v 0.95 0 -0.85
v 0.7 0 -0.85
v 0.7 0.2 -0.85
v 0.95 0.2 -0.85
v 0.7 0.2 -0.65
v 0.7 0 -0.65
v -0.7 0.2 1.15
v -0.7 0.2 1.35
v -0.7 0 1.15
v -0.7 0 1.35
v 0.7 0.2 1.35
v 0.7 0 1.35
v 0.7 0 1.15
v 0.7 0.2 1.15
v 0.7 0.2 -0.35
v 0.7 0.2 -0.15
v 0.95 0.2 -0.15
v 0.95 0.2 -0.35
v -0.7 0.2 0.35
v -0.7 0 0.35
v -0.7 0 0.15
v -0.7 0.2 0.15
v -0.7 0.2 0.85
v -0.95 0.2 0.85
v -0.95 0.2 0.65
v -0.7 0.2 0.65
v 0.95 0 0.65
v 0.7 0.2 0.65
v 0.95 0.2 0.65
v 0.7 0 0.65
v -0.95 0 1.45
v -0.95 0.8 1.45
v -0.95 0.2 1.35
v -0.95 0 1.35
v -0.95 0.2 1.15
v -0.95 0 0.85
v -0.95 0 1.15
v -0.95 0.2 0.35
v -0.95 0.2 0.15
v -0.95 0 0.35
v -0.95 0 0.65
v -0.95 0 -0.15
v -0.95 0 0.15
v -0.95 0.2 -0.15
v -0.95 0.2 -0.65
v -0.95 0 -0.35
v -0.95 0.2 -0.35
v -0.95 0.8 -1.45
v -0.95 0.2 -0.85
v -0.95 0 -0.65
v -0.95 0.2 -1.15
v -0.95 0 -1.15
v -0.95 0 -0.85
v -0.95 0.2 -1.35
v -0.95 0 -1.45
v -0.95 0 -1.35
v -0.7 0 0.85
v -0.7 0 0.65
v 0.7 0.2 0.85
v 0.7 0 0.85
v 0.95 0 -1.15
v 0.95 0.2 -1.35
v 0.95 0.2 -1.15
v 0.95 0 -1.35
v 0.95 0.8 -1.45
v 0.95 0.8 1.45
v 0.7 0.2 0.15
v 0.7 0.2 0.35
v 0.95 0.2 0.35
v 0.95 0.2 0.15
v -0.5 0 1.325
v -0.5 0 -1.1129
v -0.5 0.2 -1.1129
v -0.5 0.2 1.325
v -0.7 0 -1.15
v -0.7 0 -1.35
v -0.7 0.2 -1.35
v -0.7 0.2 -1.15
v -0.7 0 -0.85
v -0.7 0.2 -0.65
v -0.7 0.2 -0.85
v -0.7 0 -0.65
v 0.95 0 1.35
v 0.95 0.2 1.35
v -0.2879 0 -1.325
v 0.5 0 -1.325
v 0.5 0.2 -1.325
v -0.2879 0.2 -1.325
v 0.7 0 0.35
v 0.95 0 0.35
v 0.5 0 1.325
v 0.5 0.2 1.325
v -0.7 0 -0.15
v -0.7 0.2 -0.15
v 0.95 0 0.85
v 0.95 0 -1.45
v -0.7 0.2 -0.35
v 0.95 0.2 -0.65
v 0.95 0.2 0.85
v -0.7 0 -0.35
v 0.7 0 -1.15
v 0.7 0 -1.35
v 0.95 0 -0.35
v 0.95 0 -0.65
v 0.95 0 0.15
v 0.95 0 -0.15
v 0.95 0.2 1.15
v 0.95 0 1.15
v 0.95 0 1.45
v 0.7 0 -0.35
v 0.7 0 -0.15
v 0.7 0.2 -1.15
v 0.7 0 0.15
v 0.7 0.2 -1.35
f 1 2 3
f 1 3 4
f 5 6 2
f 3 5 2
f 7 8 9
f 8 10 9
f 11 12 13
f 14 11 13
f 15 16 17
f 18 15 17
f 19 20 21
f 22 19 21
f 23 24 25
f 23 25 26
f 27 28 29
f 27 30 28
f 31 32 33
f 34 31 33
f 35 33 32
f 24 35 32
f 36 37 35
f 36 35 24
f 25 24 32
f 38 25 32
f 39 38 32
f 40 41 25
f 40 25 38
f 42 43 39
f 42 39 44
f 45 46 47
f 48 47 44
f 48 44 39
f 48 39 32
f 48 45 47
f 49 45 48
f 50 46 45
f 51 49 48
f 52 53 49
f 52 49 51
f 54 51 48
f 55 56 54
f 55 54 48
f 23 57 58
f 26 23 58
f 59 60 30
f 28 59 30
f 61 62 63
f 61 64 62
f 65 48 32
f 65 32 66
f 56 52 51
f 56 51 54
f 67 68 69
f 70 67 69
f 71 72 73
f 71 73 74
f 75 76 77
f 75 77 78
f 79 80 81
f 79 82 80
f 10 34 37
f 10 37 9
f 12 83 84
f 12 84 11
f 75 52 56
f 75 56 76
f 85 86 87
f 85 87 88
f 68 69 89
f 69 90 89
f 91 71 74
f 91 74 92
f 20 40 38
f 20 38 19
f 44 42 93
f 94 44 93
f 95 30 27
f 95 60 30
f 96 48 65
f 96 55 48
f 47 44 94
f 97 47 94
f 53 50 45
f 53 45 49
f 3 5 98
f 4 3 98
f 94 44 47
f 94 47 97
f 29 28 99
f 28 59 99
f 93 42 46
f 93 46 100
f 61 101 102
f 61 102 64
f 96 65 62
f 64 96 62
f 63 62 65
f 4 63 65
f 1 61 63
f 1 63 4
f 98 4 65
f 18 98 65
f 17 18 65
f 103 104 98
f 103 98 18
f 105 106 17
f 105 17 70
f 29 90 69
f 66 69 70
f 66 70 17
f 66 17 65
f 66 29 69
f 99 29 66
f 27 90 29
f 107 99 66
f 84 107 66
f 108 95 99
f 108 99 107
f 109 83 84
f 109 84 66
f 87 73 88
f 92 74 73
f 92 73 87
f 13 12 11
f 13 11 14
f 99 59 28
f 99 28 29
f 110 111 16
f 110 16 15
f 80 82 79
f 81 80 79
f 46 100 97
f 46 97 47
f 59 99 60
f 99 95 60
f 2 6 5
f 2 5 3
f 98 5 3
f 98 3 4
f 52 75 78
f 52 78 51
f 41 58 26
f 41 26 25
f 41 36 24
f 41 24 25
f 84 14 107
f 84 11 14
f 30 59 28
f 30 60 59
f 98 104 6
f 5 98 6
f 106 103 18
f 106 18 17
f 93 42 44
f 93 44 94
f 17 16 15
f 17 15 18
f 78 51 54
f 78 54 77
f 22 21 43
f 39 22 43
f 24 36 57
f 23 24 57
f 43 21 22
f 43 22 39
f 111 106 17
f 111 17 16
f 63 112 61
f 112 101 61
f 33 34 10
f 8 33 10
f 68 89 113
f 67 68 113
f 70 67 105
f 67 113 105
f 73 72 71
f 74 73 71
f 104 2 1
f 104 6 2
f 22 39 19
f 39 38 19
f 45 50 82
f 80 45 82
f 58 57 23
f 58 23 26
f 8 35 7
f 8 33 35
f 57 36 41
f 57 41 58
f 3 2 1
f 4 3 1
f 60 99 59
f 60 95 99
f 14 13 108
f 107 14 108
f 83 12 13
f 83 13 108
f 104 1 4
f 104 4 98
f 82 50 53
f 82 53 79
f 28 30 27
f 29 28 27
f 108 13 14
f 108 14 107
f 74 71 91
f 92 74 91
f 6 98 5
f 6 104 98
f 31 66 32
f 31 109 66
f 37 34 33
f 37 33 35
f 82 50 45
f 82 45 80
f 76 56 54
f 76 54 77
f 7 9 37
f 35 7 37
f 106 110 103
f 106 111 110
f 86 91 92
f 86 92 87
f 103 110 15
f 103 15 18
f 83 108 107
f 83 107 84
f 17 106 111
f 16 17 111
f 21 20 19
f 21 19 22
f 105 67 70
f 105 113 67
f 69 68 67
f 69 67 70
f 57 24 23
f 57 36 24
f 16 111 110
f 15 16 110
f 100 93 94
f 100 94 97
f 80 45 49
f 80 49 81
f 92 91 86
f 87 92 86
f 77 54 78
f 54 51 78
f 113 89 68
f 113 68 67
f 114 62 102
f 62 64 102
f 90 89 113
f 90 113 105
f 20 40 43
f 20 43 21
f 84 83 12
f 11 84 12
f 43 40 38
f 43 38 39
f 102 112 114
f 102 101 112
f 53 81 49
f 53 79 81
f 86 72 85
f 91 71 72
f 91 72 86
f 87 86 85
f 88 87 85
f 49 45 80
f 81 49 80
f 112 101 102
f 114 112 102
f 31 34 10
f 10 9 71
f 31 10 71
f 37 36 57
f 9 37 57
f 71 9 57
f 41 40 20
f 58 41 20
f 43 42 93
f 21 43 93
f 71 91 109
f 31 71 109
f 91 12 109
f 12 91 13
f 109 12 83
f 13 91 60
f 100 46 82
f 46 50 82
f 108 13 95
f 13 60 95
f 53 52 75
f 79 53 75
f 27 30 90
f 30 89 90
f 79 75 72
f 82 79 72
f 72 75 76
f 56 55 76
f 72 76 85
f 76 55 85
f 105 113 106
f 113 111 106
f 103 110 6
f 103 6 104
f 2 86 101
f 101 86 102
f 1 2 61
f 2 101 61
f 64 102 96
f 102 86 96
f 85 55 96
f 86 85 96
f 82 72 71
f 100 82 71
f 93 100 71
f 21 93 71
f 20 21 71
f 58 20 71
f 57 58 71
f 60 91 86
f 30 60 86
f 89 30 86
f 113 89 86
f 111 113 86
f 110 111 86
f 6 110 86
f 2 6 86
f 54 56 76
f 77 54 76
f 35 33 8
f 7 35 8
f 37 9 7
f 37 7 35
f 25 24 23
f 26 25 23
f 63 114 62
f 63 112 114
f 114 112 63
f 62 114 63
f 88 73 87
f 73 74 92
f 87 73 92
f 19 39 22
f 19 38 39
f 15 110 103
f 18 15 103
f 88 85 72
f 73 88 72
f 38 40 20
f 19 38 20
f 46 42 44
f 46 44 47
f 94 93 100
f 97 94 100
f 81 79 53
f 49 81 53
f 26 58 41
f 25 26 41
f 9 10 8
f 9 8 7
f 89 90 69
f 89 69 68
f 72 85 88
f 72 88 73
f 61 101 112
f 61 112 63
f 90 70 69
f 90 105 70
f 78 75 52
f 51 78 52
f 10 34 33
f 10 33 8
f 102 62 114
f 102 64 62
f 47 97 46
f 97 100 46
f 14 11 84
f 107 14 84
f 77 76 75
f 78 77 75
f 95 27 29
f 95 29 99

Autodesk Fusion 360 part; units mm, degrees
sketch "草图1" plane through (0, 0, 0) normal (0, 1, 0) x (1, 0, 0)
  line L0 (-0.95, 1.45) -> (0.95, 1.45)
  line L1 (0.95, 1.45) -> (0.95, -1.45)
  line L2 (0.95, -1.45) -> (-0.95, -1.45)
  line L3 (-0.95, -1.45) -> (-0.95, 1.45)
  line L4 (-0.95, 1.45) -> (0.95, -1.45) construction
  line L5 (0.95, 1.45) -> (-0.95, -1.45) construction
  dimension "d1" = 2.9
  dimension "d2" = 1.9
extrude "拉伸1" add sketch "草图1" along normal blind 0.8 makes body 1
sketch "草图2" plane through (0, 0, 0) normal (0, -1, 0) x (1, 0, 0)
  line L0 (0.95, 1.45) -> (-0.95, 1.45)
  line L1 (-0.95, 1.45) -> (-0.95, -1.45)
  line L2 (-0.95, -1.45) -> (0.95, -1.45)
  line L3 (0.95, -1.45) -> (0.95, 1.45)
  line L4 (0, 2.5) -> (0, -3) construction
  line L5 (-2.5, 0) -> (3, 0) construction
  line L6 (-0.5, 1.325) -> (0.5, 1.325)
  line L7 (0.5, 1.325) -> (0.5, -1.325)
  line L8 (0.5, -1.325) -> (-0.2879, -1.325)
  line L9 (-0.2879, -1.325) -> (-0.5, -1.1129)
  line L10 (-0.5, -1.1129) -> (-0.5, 1.325)
  line L11 (-0.95, 1.35) -> (-0.7, 1.35)
  line L12 (-0.7, 1.35) -> (-0.7, 1.15)
  line L13 (-0.7, 1.15) -> (-0.95, 1.15)
  line L14 (-0.95, 1.15) -> (-0.95, 1.35)
  line L15 (-0.7, -1.15) -> (-0.95, -1.15)
  line L16 (-0.7, -1.35) -> (-0.7, -1.15)
  line L17 (-0.95, -1.15) -> (-0.95, -1.35)
  line L18 (-0.95, -1.35) -> (-0.7, -1.35)
  line L19 (-0.7, 0.65) -> (-0.95, 0.65)
  line L20 (-0.7, 0.85) -> (-0.7, 0.65)
  line L21 (-0.95, 0.85) -> (-0.7, 0.85)
  line L22 (-0.95, 0.65) -> (-0.95, 0.85)
  line L23 (-0.7, 0.15) -> (-0.95, 0.15)
  line L24 (-0.7, 0.35) -> (-0.7, 0.15)
  line L25 (-0.95, 0.35) -> (-0.7, 0.35)
  line L26 (-0.95, 0.15) -> (-0.95, 0.35)
  line L27 (-0.7, -0.35) -> (-0.95, -0.35)
  line L28 (-0.7, -0.15) -> (-0.7, -0.35)
  line L29 (-0.95, -0.15) -> (-0.7, -0.15)
  line L30 (-0.95, -0.35) -> (-0.95, -0.15)
  line L31 (-0.7, -0.85) -> (-0.95, -0.85)
  line L32 (-0.7, -0.65) -> (-0.7, -0.85)
  line L33 (-0.95, -0.65) -> (-0.7, -0.65)
  line L34 (-0.95, -0.85) -> (-0.95, -0.65)
  line L35 (-0.7, -1.35) -> (-0.95, -1.35)
  line L36 (-0.7, -1.15) -> (-0.7, -1.35)
  line L37 (-0.95, -1.15) -> (-0.7, -1.15)
  line L38 (-0.95, -1.35) -> (-0.95, -1.15)
  line L39 (0.7, 1.15) -> (0.95, 1.15)
  line L40 (0.7, 1.35) -> (0.7, 1.15)
  line L41 (0.95, 1.35) -> (0.7, 1.35)
  line L42 (0.95, 1.15) -> (0.95, 1.35)
  line L43 (0.95, 0.85) -> (0.7, 0.85)
  line L44 (0.7, 0.85) -> (0.7, 0.65)
  line L45 (0.7, 0.65) -> (0.95, 0.65)
  line L46 (0.95, 0.65) -> (0.95, 0.85)
  line L47 (0.95, 0.35) -> (0.7, 0.35)
  line L48 (0.7, 0.35) -> (0.7, 0.15)
  line L49 (0.7, 0.15) -> (0.95, 0.15)
  line L50 (0.95, 0.15) -> (0.95, 0.35)
  line L51 (0.95, -0.15) -> (0.7, -0.15)
  line L52 (0.7, -0.15) -> (0.7, -0.35)
  line L53 (0.7, -0.35) -> (0.95, -0.35)
  line L54 (0.95, -0.35) -> (0.95, -0.15)
  line L55 (0.95, -0.65) -> (0.7, -0.65)
  line L56 (0.7, -0.65) -> (0.7, -0.85)
  line L57 (0.7, -0.85) -> (0.95, -0.85)
  line L58 (0.95, -0.85) -> (0.95, -0.65)
  line L59 (0.7, -1.15) -> (0.95, -1.15)
  line L60 (0.7, -1.15) -> (0.7, -1.35)
  line L61 (0.95, -1.35) -> (0.95, -1.15)
  line L62 (0.95, -1.35) -> (0.7, -1.35)
  dimension "d5" = 1
  dimension "d6" = 2.65
  dimension "d7" = 135
  dimension "d8" = 0.3
  dimension "d9" = 0.2
  dimension "d10" = 0.25
  dimension "d11" = 2.7
  dimension "d14" = 0
  dimension "d15" = -2.5
extrude "拉伸2" cut sketch "草图2" against normal blind 0.2 contours L6 L7 L8 L9 L10 bodies 1
extrude "拉伸3" cut sketch "草图2" against normal blind 0.2 contours L3 L39 L40 L41 L42 | L1 L11 L12 L13 L14 | L3 L43 L44 L45 L46 | L1 L19 L20 L21 L22 | L3 L47 L48 L49 L50 | L1 L23 L24 L25 L26 | L3 L51 L52 L53 L54 | L1 L27 L28 L29 L30 | L3 L55 L56 L57 L58 | L1 L31 L32 L33 L34 | L3 L59 L60 L61 L62 | L1 L15 L16 L17 L18 L35 L36 L37 L38 bodies 1
extrude "拉伸4" add sketch "草图2" against normal blind 0.2 separate body contours L3 L39 L40 L41 L42 | L1 L11 L12 L13 L14 | L3 L43 L44 L45 L46 | L1 L19 L20 L21 L22 | L3 L47 L48 L49 L50 | L1 L23 L24 L25 L26 | L3 L51 L52 L53 L54 | L1 L27 L28 L29 L30 | L3 L55 L56 L57 L58 | L1 L31 L32 L33 L34 | L3 L59 L60 L61 L62 | L1 L15 L16 L17 L18 L35 L36 L37 L38 | L6 L7 L8 L9 L10 makes body 2 at (0.8667, 0, -0.7833) makes body 3 at (-0.8667, 0, -0.2167) makes body 4 at (-0.8667, 0, 0.7833) makes body 5 at (0.1667, 0, -0.371) makes body 6 at (-0.8667, 0, 0.2833) makes body 7 at (0.7833, 0, -1.2167) makes body 8 at (0.7833, 0, -0.2167) makes body 9 at (-0.8667, 0, -0.7167) makes body 10 at (0.8667, 0, 1.2167) makes body 11 at (-0.8667, 0, 1.2833) makes body 12 at (0.8667, 0, 0.7167) makes body 13 at (-0.8667, 0.0667, -1.35) makes body 14 at (0.8667, 0, 0.2167)
